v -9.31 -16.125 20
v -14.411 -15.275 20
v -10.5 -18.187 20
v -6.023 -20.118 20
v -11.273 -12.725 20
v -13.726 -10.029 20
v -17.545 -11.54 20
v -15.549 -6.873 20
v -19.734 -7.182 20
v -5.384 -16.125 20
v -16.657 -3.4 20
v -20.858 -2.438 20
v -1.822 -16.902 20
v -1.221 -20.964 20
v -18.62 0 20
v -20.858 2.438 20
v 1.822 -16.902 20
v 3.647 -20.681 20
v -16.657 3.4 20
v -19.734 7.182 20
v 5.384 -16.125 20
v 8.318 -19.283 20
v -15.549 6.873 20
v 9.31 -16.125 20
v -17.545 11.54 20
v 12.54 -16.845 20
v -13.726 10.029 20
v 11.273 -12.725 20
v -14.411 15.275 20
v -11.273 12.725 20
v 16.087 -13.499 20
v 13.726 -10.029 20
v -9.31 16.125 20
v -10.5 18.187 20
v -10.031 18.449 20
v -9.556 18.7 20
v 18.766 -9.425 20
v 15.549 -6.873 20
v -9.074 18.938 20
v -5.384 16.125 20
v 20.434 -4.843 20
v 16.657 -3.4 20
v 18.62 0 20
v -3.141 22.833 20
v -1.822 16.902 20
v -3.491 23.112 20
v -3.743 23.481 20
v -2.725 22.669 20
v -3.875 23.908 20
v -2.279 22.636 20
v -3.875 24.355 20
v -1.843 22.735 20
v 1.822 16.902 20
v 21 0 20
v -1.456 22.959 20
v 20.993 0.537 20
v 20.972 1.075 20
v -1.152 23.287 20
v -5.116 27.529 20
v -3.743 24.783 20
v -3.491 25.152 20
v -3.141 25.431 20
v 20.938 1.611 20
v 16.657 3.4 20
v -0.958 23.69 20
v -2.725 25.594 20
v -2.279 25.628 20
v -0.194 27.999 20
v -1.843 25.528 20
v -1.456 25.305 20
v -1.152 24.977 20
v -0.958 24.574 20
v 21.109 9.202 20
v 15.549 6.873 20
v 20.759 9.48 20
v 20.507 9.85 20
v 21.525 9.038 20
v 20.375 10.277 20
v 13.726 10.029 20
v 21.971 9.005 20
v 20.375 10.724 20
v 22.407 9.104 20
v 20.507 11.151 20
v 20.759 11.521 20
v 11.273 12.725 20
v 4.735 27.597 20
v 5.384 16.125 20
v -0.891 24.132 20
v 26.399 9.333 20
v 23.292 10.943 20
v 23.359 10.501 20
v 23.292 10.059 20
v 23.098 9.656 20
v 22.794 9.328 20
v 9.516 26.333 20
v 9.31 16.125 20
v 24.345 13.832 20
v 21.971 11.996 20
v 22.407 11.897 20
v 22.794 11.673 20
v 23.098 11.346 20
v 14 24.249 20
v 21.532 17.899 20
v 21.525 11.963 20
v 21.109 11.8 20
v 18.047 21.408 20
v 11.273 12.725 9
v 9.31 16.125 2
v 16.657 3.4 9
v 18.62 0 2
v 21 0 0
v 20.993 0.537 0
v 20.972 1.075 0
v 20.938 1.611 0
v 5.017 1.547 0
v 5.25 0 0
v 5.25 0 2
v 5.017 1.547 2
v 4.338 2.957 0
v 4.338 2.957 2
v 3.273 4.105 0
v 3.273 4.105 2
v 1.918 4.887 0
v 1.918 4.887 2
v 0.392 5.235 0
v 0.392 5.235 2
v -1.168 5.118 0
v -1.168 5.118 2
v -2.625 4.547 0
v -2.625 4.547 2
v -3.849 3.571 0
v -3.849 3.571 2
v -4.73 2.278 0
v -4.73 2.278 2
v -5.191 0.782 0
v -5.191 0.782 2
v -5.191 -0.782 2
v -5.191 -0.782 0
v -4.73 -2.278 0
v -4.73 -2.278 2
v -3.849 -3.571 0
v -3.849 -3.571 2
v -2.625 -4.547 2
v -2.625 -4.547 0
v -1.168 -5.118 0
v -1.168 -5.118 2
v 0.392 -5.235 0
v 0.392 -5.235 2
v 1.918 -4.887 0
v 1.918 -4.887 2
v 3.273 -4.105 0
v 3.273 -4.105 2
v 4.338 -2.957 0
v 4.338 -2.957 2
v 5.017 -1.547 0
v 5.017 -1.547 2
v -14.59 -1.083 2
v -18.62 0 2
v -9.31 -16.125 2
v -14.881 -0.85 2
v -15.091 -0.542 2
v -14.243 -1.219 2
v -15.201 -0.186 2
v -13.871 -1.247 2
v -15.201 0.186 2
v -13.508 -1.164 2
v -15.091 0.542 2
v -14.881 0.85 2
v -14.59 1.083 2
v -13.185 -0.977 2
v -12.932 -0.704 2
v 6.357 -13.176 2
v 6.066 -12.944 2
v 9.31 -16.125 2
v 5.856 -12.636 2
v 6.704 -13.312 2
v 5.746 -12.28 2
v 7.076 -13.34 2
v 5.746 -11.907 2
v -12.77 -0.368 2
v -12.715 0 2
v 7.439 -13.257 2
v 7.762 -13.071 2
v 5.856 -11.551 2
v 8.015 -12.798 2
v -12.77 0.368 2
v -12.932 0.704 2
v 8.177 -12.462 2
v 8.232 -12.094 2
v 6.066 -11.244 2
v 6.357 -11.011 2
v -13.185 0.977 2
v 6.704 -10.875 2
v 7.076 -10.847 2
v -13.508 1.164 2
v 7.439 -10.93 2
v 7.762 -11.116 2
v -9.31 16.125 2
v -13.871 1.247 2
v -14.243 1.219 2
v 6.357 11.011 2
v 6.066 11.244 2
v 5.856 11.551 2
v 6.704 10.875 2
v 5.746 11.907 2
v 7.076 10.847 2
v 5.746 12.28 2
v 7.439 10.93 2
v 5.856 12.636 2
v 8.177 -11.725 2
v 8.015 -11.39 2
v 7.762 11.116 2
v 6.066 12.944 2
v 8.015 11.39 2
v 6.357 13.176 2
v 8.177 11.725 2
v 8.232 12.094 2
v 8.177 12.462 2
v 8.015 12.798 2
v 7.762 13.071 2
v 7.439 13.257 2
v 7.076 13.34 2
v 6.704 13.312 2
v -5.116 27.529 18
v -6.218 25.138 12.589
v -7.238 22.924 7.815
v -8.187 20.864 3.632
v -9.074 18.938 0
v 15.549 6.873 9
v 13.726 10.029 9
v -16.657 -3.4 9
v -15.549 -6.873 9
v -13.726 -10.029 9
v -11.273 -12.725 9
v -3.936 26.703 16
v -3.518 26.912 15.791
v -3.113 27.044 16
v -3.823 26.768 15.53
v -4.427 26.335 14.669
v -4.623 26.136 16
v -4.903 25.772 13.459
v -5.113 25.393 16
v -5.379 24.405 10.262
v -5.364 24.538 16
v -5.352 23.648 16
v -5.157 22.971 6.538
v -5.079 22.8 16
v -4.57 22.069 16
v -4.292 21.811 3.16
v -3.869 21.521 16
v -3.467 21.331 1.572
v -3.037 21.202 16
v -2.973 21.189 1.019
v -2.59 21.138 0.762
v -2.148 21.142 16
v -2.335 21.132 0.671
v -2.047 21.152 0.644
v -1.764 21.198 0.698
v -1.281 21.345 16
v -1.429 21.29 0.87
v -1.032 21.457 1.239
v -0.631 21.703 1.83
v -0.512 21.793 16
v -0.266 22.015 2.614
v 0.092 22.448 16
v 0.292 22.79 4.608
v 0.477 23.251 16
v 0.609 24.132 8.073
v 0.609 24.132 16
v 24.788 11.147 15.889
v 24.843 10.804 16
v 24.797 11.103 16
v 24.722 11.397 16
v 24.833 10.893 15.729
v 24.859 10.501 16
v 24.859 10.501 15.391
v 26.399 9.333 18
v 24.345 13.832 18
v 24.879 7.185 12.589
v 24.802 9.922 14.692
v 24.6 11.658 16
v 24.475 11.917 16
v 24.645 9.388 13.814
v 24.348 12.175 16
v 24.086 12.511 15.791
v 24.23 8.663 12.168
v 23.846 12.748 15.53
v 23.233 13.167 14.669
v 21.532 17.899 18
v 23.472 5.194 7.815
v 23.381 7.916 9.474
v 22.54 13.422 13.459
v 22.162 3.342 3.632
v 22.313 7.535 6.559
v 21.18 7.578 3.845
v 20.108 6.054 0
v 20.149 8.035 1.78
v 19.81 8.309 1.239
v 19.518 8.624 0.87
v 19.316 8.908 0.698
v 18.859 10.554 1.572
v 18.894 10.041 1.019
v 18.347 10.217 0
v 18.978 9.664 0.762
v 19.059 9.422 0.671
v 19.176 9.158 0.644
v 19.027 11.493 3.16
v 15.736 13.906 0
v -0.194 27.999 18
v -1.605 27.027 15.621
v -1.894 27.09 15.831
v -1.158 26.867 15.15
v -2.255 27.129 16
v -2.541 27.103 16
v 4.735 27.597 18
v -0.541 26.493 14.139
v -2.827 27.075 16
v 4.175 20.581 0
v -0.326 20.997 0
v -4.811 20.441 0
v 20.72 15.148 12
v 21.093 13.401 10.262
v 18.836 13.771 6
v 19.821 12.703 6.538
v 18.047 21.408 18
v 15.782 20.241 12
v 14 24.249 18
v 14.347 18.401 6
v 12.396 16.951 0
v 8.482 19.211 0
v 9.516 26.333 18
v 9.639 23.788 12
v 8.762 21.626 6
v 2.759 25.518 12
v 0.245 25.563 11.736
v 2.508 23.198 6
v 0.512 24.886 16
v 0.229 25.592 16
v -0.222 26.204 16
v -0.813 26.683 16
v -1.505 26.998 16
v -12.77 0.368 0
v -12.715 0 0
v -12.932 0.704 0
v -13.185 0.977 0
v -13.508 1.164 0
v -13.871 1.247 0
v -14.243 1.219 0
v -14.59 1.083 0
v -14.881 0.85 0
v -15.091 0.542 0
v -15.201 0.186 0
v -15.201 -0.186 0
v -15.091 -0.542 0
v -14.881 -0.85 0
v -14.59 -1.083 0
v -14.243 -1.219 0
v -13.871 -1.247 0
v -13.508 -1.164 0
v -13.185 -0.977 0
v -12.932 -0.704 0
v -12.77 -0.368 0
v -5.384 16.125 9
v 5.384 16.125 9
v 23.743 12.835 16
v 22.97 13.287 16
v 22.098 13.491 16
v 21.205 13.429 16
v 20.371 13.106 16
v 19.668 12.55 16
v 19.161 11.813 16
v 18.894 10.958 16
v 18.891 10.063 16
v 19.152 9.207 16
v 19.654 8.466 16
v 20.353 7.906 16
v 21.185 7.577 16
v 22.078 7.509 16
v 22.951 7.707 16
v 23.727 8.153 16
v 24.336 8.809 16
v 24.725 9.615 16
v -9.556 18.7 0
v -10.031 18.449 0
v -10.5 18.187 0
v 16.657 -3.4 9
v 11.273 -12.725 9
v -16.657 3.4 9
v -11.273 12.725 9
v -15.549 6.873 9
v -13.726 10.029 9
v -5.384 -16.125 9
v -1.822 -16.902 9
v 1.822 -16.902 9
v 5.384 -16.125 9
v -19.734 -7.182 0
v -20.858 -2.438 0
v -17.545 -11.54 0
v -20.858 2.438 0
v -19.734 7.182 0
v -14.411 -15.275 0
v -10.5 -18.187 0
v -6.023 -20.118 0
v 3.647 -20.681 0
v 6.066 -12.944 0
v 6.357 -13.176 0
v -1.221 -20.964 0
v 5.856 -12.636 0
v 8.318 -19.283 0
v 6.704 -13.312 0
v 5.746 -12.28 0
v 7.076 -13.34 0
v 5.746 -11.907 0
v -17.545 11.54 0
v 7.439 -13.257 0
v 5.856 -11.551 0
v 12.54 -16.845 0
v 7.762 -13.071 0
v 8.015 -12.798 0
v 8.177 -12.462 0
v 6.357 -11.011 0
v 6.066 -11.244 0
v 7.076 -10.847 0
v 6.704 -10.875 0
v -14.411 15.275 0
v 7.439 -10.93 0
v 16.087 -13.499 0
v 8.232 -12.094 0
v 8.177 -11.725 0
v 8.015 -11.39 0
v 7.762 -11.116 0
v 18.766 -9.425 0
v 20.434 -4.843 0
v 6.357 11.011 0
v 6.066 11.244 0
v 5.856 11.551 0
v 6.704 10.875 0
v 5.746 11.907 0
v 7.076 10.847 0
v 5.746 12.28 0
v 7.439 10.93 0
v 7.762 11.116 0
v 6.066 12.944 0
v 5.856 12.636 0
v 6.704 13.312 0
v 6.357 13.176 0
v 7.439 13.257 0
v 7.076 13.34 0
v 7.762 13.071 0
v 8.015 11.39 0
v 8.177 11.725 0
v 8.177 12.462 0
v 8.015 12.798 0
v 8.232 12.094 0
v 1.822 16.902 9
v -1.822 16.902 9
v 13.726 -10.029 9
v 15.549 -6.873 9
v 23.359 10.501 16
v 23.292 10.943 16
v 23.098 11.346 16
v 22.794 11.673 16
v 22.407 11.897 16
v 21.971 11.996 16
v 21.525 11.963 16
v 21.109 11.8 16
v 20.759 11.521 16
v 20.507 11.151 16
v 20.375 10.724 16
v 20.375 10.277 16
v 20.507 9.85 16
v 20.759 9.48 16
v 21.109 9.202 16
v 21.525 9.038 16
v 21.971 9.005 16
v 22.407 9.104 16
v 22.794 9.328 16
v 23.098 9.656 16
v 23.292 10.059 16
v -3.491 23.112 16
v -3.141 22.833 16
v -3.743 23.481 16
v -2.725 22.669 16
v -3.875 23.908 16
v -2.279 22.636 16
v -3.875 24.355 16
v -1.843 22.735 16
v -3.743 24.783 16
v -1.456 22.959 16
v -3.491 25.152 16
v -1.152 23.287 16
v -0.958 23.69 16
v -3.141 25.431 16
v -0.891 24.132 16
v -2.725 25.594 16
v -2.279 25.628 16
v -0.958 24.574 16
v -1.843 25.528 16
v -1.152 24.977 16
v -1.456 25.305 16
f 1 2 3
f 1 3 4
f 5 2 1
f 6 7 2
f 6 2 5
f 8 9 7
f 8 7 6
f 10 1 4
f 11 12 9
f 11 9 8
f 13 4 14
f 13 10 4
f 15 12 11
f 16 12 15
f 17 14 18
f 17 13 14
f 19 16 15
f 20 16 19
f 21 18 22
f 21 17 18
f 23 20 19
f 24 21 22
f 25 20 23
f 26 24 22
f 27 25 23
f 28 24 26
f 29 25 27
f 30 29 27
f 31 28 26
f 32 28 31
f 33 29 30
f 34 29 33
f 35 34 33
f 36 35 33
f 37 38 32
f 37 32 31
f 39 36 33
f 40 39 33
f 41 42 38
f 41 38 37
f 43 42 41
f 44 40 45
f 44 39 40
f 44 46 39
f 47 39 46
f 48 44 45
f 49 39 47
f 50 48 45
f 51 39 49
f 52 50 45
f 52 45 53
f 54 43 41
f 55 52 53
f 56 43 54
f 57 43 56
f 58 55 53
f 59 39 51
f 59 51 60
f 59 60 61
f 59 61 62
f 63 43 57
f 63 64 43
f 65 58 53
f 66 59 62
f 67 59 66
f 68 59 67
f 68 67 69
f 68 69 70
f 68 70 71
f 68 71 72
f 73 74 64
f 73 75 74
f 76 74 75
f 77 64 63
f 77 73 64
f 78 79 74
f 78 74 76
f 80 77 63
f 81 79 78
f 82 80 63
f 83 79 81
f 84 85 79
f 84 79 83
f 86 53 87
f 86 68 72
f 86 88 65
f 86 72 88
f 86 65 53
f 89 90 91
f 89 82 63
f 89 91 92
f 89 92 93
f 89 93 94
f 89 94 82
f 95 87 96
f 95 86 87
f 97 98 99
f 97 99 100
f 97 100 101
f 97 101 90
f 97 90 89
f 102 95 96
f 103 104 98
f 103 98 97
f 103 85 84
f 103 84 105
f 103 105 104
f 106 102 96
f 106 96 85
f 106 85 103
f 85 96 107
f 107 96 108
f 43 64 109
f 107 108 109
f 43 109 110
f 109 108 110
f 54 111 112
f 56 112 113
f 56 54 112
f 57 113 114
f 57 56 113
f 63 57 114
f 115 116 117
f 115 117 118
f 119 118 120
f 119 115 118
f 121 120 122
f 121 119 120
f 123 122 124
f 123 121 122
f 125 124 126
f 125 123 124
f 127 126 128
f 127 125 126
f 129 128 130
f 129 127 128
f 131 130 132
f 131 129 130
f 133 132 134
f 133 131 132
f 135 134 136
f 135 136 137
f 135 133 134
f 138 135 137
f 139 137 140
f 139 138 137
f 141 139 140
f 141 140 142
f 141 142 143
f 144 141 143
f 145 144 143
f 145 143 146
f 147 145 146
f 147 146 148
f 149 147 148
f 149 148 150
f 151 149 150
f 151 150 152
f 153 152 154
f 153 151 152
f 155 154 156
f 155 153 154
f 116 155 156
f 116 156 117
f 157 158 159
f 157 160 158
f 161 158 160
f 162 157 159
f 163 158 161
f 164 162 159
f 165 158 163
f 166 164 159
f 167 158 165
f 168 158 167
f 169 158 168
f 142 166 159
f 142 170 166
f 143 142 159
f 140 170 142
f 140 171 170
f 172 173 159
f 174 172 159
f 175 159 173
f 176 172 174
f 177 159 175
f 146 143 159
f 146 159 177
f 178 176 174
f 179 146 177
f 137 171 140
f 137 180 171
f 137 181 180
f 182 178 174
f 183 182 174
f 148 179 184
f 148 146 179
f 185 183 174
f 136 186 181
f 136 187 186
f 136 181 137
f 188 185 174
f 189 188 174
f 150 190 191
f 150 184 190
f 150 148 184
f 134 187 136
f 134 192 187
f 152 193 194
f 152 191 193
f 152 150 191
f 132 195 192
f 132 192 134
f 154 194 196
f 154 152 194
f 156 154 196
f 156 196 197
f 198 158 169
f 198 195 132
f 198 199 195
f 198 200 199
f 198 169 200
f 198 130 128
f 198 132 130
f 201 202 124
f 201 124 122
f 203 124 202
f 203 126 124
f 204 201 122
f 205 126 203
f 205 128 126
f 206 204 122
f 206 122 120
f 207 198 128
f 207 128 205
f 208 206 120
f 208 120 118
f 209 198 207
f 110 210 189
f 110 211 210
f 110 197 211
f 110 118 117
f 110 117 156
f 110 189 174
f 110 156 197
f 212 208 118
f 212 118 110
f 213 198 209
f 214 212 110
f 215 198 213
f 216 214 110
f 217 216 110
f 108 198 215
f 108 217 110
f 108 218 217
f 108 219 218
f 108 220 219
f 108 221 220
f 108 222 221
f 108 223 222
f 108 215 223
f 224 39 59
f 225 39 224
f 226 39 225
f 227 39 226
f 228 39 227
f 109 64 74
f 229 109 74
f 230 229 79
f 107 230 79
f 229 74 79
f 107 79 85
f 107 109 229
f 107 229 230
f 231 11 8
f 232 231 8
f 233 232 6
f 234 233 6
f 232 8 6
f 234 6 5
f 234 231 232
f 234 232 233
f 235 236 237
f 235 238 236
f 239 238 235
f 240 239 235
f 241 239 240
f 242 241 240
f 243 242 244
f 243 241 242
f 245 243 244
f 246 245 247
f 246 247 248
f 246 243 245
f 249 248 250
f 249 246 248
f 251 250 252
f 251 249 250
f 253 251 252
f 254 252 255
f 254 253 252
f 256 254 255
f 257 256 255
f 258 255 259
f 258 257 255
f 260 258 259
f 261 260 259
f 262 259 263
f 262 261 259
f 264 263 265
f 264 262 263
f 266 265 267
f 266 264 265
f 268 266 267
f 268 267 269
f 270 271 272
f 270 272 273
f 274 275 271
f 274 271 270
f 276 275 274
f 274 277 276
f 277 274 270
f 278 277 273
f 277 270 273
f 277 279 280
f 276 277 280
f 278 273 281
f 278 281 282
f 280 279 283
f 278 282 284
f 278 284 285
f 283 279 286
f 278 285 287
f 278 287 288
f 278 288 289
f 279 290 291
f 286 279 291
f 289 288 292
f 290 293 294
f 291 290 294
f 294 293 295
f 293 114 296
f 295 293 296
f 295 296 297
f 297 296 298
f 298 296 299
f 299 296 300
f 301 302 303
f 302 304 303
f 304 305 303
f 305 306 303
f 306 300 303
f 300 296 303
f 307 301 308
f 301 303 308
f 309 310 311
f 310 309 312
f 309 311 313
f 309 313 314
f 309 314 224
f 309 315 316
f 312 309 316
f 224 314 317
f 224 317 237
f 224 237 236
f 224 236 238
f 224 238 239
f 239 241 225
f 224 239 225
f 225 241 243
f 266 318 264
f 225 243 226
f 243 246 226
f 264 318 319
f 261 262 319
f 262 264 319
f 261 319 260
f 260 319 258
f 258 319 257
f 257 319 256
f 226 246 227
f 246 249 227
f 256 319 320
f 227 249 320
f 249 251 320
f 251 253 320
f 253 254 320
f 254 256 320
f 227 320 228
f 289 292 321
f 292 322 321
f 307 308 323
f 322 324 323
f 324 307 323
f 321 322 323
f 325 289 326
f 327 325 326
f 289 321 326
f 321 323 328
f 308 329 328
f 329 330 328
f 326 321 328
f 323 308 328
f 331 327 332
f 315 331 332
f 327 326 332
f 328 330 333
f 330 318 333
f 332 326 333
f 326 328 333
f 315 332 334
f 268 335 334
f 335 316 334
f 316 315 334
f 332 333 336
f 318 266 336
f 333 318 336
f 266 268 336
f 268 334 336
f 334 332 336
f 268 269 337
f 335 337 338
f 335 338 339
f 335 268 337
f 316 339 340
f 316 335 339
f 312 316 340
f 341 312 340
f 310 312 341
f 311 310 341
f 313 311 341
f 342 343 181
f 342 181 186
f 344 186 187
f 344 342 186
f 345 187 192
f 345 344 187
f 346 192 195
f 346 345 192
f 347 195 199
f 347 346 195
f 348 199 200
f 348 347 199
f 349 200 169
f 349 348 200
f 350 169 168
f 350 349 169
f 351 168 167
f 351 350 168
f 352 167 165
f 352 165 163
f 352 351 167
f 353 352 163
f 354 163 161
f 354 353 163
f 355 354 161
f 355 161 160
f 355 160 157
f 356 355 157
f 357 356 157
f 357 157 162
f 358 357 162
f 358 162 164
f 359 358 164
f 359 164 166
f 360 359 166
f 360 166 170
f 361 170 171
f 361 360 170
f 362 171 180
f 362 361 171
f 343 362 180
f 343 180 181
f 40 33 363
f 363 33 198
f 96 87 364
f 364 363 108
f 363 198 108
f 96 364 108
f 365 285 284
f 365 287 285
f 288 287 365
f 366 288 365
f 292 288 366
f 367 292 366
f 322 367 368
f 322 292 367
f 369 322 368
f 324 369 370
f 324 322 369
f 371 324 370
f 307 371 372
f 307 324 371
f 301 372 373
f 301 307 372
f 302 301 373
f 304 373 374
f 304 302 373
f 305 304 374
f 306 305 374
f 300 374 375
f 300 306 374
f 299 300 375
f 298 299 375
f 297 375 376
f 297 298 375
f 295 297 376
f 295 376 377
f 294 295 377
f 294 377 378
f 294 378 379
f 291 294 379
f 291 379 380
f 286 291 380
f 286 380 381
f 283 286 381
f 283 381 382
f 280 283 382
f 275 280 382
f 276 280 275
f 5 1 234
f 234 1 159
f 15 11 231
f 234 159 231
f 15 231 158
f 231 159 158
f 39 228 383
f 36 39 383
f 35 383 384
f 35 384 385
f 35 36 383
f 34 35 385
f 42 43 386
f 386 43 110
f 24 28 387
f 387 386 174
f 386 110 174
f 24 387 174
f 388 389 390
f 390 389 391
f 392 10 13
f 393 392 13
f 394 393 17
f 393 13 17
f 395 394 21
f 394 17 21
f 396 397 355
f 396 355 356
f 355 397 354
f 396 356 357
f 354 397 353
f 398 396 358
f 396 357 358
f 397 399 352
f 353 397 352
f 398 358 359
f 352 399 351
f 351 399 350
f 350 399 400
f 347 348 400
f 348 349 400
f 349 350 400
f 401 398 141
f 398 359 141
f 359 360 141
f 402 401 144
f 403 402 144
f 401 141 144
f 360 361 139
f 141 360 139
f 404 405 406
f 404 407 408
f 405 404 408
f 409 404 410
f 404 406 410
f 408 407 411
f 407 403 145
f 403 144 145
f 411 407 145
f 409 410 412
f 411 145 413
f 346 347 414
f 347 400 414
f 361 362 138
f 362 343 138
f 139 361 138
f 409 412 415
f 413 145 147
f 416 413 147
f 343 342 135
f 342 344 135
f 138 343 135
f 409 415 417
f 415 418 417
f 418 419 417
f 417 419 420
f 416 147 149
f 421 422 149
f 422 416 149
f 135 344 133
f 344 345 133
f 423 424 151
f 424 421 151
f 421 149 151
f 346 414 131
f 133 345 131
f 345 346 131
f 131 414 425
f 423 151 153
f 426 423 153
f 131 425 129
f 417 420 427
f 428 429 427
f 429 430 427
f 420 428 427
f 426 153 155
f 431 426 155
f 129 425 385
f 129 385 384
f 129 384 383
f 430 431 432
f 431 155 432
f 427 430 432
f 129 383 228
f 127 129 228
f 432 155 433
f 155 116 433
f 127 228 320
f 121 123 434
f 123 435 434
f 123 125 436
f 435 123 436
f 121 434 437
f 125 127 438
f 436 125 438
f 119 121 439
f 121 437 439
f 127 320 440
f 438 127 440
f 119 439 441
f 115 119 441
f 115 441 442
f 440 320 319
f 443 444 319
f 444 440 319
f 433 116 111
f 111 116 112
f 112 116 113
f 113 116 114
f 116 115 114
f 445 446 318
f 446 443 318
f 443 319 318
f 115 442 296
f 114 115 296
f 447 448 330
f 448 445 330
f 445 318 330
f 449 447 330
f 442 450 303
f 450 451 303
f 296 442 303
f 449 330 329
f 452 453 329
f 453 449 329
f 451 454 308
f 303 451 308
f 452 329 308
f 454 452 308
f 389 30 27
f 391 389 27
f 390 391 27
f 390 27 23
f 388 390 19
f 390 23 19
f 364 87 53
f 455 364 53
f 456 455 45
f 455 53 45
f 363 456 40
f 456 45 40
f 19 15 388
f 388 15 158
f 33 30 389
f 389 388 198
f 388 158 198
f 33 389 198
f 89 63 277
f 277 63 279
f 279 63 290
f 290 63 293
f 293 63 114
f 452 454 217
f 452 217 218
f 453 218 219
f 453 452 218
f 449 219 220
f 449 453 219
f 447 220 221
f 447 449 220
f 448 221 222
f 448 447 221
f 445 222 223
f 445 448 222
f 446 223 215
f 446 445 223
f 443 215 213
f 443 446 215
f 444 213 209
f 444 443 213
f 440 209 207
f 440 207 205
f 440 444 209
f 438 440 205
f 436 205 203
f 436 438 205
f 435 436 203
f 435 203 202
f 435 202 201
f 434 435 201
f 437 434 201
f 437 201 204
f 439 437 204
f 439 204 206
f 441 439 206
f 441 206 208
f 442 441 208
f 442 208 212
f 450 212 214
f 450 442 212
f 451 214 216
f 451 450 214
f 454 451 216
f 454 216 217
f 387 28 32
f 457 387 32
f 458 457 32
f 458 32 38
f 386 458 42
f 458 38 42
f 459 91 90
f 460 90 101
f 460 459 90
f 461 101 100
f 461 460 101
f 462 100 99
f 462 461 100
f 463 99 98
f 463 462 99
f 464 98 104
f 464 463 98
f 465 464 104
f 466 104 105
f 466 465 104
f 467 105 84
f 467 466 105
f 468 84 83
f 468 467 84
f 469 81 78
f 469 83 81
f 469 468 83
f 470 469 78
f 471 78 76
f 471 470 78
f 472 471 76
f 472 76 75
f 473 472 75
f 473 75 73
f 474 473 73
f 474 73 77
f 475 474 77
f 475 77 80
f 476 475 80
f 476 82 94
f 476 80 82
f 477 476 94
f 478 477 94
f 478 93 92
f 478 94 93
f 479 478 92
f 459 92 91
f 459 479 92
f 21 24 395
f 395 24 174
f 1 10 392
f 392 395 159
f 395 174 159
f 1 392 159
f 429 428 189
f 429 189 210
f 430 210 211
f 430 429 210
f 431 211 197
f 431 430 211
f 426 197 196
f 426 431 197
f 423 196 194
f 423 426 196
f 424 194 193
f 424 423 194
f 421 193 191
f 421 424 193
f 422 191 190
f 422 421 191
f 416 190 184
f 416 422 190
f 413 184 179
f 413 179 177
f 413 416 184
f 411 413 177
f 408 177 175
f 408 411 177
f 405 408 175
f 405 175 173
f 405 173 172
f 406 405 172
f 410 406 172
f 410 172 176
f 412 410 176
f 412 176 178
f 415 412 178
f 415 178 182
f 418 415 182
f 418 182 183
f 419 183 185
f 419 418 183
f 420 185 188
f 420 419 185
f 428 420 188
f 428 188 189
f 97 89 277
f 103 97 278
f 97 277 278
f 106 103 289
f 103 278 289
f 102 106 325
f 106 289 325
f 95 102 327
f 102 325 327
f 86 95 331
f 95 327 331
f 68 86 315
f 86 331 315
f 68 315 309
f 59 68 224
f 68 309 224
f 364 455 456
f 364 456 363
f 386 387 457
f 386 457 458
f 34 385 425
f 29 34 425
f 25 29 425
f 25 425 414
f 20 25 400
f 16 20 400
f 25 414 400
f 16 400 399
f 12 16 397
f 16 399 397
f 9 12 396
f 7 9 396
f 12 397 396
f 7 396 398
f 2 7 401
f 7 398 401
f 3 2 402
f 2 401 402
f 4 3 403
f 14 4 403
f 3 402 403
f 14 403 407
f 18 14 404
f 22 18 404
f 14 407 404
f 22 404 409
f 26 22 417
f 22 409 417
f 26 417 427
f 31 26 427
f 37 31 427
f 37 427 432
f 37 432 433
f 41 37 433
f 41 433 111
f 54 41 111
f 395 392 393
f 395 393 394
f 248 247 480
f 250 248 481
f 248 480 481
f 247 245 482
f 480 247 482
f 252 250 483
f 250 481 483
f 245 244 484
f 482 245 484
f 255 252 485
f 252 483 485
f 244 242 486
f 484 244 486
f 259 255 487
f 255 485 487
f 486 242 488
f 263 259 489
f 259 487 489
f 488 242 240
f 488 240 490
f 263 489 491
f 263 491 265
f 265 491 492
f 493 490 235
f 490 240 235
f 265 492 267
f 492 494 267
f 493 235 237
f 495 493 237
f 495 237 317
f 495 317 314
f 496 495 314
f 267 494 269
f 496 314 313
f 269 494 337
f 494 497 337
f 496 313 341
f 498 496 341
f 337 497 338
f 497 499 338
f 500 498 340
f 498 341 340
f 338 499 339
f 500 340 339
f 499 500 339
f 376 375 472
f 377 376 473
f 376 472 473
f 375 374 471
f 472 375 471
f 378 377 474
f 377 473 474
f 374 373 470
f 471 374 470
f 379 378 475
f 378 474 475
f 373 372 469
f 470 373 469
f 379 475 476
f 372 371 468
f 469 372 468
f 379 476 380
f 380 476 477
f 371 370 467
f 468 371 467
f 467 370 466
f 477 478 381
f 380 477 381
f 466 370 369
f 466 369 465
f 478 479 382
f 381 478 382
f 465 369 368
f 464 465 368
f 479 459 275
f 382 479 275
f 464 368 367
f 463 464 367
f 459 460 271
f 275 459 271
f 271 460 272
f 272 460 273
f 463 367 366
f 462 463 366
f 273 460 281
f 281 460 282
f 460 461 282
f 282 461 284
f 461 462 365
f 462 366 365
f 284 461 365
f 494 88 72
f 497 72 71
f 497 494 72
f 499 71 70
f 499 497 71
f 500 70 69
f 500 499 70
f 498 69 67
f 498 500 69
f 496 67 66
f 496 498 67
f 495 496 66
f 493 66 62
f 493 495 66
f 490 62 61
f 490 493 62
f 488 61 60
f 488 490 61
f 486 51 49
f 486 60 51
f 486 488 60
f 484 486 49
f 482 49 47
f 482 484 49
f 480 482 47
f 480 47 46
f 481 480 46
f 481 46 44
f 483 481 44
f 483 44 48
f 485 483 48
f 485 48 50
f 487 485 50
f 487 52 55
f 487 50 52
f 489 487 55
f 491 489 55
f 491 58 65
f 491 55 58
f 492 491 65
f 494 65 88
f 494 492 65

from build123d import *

# Parameters (mm, degrees)
F0_R         = 1.25
F0_R_2       = 5.25
F1_DEPTH     = 2
F2_DEPTH     = 20
F3_DEPTH     = 20
F4_T4_DEPTH  = 68.3486393209
F4_S5_R      = 21
F4_T6_DEPTH  = 36
F4_T10_DEPTH = 68.3486393209
F4_S11_R     = 21
F4_T12_DEPTH = 36
F5_T2_ANGLE  = 272.1691776214
F6_R         = 1.5
F7_DEPTH     = 25
F6_R_2       = 3
F8_DEPTH     = 16
F10_DEPTH    = 11


# Not quite as in the source:
# - a fillet or chamfer that OpenCascade refuses, or shapes differently, is made with other operations: its cross-section is extruded or revolved along the edge and cut away or added


with BuildPart() as f1:
    # F0 (on Top) → F1 (new body)
    with BuildSketch(Plane.XY):
        Polygon((-9.3097730907, -16.125), (9.3097730907, -16.125), (18.6195461814, 0), (9.3097730907, 16.125), (-9.3097730907, 16.125), (-18.6195461814, 0), align=None)
        with Locations((6.982329818, -12.09375)):
            Circle(F0_R, mode=Mode.SUBTRACT)
        with Locations((-13.964659636, 0)):
            Circle(F0_R, mode=Mode.SUBTRACT)
        Circle(F0_R_2, mode=Mode.SUBTRACT)
        with Locations((6.982329818, 12.09375)):
            Circle(F0_R, mode=Mode.SUBTRACT)
    extrude(amount=F1_DEPTH)

    # F0 (on Top) → F2 (join)
    with BuildSketch(Plane.XY):
        with BuildLine():
            ThreePointArc((-10.5, 18.1865334795), (-10.5, -18.1865334795), (21, 0))
            ThreePointArc((21, 0), (10.5, 18.1865334795), (-10.5, 18.1865334795))
        make_face()
        Polygon((18.6195461814, 0), (9.3097730907, -16.125), (-9.3097730907, -16.125), (-18.6195461814, 0), (-9.3097730907, 16.125), (9.3097730907, 16.125), align=None, mode=Mode.SUBTRACT)
    extrude(amount=F2_DEPTH)

    # F0 (on Top) → F3 (join)
    with BuildSketch(Plane.XY):
        with BuildLine():
            ThreePointArc((-10.5, 18.1865334795), (10.5, 18.1865334795), (21, 0))
            Line((21, 0), (28, 0))
            ThreePointArc((28, 0), (14, 24.248711306), (-14, 24.248711306))
            Line((-14, 24.248711306), (-10.5, 18.1865334795))
        make_face()
    extrude(amount=F3_DEPTH)

    # F4: chamfer of 7 on 2 edges, made by hand


with BuildPart() as f4_tool2:
    # F4_s3 → F4_t4 (new body)
    with BuildSketch(Plane.XY.offset(-24.1743196605)):
        with BuildLine():
            Line((-9.8994949366, 17.1464281995), (-5.1164228135, 27.5285709326))
            ThreePointArc((-5.1164228135, 27.5285709326), (-9.6039256501, 26.3014184429), (-14, 24.248711306))
            Line((-14, 24.248711306), (-9.8994949366, 17.1464281995))
        make_face()
    extrude(amount=F4_T4_DEPTH)

    # F4_s5 → F4_t6 (cut, symmetric)
    with BuildSketch(Plane.XY.offset(10)):
        Circle(F4_S5_R)
    extrude(amount=F4_T6_DEPTH, both=True, mode=Mode.SUBTRACT)


with BuildPart() as f1_1:
    add(f1.part)

    # F4_t1: cut F4_tool2
    add(f4_tool2.part, mode=Mode.SUBTRACT)


with BuildPart() as f4_tool8:
    # F4_s9 → F4_t10 (new body)
    with BuildSketch(Plane.XY.offset(-24.1743196605)):
        with BuildLine():
            Line((19.7989898732, 0), (26.3986531643, 9.3333333333))
            ThreePointArc((26.3986531643, 9.3333333333), (27.5796593521, 4.8334656324), (28, 0))
            Line((28, 0), (19.7989898732, 0))
        make_face()
    extrude(amount=F4_T10_DEPTH)

    # F4_s11 → F4_t12 (cut, symmetric)
    with BuildSketch(Plane.XY.offset(10)):
        Circle(F4_S11_R)
    extrude(amount=F4_T12_DEPTH, both=True, mode=Mode.SUBTRACT)


with BuildPart() as f1_2:
    add(f1_1.part)

    # F4_t7: cut F4_tool8
    add(f4_tool8.part, mode=Mode.SUBTRACT)

    # F5: chamfer of 18 x 7 on 1 edges, made by hand

    # F5_s1 → F5_t2 (revolve, cut)
    with BuildSketch(Plane(origin=(0, 0, 0), x_dir=(0, 0, 1), z_dir=(-0.9706518309, -0.2404891332, 0))):
        Polygon((18, -28), (0, -21), (0, -28), align=None)
    revolve(axis=Axis((0, 0, 0), (0, 0, 1)), revolution_arc=F5_T2_ANGLE, mode=Mode.SUBTRACT)

    # F6 (on face) → F7 (cut)
    with BuildSketch(Plane.XY):
        with Locations((21.8586163831, 10.5006375909)):
            Circle(F6_R)
        with Locations((-2.3912845495, 24.1318100897)):
            Circle(F6_R)
    extrude(amount=F7_DEPTH, mode=Mode.SUBTRACT)

    # F6 (on face) → F8 (cut)
    with BuildSketch(Plane.XY):
        with Locations((-2.3912845495, 24.1318100897)):
            Circle(F6_R_2)
        with Locations((-2.3912845495, 24.1318100897)):
            Circle(F6_R, mode=Mode.SUBTRACT)
        with Locations((21.8586163831, 10.5006375909)):
            Circle(F6_R_2)
        with Locations((21.8586163831, 10.5006375909)):
            Circle(F6_R, mode=Mode.SUBTRACT)
    extrude(amount=F8_DEPTH, mode=Mode.SUBTRACT)

    # F9 (on face) → F10 (cut)
    with BuildSketch(Plane.XY.offset(20)):
        with BuildLine():
            ThreePointArc((16.6565165694, -3.4000670246), (16.9139111633, -1.7086863843), (17, 0))
            ThreePointArc((17, 0), (16.9139111633, 1.7086863843), (16.6565165694, 3.4000670246))
            Line((16.6565165694, 3.4000670246), (11.2728027026, 12.7249329754))
            ThreePointArc((11.2728027026, 12.7249329754), (8.5, 14.7224318643), (5.3837138668, 16.125))
            Line((5.3837138668, 16.125), (-5.3837138668, 16.125))
            ThreePointArc((-5.3837138668, 16.125), (-8.5, 14.7224318643), (-11.2728027026, 12.7249329754))
            Line((-11.2728027026, 12.7249329754), (-16.6565165694, 3.4000670246))
            ThreePointArc((-16.6565165694, 3.4000670246), (-17, 0), (-16.6565165694, -3.4000670246))
            Line((-16.6565165694, -3.4000670246), (-11.2728027026, -12.7249329754))
            ThreePointArc((-11.2728027026, -12.7249329754), (-8.5, -14.7224318643), (-5.3837138668, -16.125))
            Line((-5.3837138668, -16.125), (5.3837138668, -16.125))
            ThreePointArc((5.3837138668, -16.125), (8.5, -14.7224318643), (11.2728027026, -12.7249329754))
            Line((11.2728027026, -12.7249329754), (16.6565165694, -3.4000670246))
        make_face()
        with BuildLine():
            Line((11.2728027026, 12.7249329754), (16.6565165694, 3.4000670246))
            ThreePointArc((16.6565165694, 3.4000670246), (14.7224318643, 8.5), (11.2728027026, 12.7249329754))
        make_face()
        with BuildLine():
            ThreePointArc((11.2728027026, -12.7249329754), (14.7224318643, -8.5), (16.6565165694, -3.4000670246))
            Line((16.6565165694, -3.4000670246), (11.2728027026, -12.7249329754))
        make_face()
        with BuildLine():
            Line((-5.3837138668, 16.125), (5.3837138668, 16.125))
            ThreePointArc((5.3837138668, 16.125), (0, 17), (-5.3837138668, 16.125))
        make_face()
        with BuildLine():
            ThreePointArc((-5.3837138668, -16.125), (0, -17), (5.3837138668, -16.125))
            Line((5.3837138668, -16.125), (-5.3837138668, -16.125))
        make_face()
        with BuildLine():
            Line((-16.6565165694, 3.4000670246), (-11.2728027026, 12.7249329754))
            ThreePointArc((-11.2728027026, 12.7249329754), (-14.7224318643, 8.5), (-16.6565165694, 3.4000670246))
        make_face()
        with BuildLine():
            ThreePointArc((-16.6565165694, -3.4000670246), (-14.7224318643, -8.5), (-11.2728027026, -12.7249329754))
            Line((-11.2728027026, -12.7249329754), (-16.6565165694, -3.4000670246))
        make_face()
    extrude(amount=-F10_DEPTH, mode=Mode.SUBTRACT)


solid = f1_2.part
